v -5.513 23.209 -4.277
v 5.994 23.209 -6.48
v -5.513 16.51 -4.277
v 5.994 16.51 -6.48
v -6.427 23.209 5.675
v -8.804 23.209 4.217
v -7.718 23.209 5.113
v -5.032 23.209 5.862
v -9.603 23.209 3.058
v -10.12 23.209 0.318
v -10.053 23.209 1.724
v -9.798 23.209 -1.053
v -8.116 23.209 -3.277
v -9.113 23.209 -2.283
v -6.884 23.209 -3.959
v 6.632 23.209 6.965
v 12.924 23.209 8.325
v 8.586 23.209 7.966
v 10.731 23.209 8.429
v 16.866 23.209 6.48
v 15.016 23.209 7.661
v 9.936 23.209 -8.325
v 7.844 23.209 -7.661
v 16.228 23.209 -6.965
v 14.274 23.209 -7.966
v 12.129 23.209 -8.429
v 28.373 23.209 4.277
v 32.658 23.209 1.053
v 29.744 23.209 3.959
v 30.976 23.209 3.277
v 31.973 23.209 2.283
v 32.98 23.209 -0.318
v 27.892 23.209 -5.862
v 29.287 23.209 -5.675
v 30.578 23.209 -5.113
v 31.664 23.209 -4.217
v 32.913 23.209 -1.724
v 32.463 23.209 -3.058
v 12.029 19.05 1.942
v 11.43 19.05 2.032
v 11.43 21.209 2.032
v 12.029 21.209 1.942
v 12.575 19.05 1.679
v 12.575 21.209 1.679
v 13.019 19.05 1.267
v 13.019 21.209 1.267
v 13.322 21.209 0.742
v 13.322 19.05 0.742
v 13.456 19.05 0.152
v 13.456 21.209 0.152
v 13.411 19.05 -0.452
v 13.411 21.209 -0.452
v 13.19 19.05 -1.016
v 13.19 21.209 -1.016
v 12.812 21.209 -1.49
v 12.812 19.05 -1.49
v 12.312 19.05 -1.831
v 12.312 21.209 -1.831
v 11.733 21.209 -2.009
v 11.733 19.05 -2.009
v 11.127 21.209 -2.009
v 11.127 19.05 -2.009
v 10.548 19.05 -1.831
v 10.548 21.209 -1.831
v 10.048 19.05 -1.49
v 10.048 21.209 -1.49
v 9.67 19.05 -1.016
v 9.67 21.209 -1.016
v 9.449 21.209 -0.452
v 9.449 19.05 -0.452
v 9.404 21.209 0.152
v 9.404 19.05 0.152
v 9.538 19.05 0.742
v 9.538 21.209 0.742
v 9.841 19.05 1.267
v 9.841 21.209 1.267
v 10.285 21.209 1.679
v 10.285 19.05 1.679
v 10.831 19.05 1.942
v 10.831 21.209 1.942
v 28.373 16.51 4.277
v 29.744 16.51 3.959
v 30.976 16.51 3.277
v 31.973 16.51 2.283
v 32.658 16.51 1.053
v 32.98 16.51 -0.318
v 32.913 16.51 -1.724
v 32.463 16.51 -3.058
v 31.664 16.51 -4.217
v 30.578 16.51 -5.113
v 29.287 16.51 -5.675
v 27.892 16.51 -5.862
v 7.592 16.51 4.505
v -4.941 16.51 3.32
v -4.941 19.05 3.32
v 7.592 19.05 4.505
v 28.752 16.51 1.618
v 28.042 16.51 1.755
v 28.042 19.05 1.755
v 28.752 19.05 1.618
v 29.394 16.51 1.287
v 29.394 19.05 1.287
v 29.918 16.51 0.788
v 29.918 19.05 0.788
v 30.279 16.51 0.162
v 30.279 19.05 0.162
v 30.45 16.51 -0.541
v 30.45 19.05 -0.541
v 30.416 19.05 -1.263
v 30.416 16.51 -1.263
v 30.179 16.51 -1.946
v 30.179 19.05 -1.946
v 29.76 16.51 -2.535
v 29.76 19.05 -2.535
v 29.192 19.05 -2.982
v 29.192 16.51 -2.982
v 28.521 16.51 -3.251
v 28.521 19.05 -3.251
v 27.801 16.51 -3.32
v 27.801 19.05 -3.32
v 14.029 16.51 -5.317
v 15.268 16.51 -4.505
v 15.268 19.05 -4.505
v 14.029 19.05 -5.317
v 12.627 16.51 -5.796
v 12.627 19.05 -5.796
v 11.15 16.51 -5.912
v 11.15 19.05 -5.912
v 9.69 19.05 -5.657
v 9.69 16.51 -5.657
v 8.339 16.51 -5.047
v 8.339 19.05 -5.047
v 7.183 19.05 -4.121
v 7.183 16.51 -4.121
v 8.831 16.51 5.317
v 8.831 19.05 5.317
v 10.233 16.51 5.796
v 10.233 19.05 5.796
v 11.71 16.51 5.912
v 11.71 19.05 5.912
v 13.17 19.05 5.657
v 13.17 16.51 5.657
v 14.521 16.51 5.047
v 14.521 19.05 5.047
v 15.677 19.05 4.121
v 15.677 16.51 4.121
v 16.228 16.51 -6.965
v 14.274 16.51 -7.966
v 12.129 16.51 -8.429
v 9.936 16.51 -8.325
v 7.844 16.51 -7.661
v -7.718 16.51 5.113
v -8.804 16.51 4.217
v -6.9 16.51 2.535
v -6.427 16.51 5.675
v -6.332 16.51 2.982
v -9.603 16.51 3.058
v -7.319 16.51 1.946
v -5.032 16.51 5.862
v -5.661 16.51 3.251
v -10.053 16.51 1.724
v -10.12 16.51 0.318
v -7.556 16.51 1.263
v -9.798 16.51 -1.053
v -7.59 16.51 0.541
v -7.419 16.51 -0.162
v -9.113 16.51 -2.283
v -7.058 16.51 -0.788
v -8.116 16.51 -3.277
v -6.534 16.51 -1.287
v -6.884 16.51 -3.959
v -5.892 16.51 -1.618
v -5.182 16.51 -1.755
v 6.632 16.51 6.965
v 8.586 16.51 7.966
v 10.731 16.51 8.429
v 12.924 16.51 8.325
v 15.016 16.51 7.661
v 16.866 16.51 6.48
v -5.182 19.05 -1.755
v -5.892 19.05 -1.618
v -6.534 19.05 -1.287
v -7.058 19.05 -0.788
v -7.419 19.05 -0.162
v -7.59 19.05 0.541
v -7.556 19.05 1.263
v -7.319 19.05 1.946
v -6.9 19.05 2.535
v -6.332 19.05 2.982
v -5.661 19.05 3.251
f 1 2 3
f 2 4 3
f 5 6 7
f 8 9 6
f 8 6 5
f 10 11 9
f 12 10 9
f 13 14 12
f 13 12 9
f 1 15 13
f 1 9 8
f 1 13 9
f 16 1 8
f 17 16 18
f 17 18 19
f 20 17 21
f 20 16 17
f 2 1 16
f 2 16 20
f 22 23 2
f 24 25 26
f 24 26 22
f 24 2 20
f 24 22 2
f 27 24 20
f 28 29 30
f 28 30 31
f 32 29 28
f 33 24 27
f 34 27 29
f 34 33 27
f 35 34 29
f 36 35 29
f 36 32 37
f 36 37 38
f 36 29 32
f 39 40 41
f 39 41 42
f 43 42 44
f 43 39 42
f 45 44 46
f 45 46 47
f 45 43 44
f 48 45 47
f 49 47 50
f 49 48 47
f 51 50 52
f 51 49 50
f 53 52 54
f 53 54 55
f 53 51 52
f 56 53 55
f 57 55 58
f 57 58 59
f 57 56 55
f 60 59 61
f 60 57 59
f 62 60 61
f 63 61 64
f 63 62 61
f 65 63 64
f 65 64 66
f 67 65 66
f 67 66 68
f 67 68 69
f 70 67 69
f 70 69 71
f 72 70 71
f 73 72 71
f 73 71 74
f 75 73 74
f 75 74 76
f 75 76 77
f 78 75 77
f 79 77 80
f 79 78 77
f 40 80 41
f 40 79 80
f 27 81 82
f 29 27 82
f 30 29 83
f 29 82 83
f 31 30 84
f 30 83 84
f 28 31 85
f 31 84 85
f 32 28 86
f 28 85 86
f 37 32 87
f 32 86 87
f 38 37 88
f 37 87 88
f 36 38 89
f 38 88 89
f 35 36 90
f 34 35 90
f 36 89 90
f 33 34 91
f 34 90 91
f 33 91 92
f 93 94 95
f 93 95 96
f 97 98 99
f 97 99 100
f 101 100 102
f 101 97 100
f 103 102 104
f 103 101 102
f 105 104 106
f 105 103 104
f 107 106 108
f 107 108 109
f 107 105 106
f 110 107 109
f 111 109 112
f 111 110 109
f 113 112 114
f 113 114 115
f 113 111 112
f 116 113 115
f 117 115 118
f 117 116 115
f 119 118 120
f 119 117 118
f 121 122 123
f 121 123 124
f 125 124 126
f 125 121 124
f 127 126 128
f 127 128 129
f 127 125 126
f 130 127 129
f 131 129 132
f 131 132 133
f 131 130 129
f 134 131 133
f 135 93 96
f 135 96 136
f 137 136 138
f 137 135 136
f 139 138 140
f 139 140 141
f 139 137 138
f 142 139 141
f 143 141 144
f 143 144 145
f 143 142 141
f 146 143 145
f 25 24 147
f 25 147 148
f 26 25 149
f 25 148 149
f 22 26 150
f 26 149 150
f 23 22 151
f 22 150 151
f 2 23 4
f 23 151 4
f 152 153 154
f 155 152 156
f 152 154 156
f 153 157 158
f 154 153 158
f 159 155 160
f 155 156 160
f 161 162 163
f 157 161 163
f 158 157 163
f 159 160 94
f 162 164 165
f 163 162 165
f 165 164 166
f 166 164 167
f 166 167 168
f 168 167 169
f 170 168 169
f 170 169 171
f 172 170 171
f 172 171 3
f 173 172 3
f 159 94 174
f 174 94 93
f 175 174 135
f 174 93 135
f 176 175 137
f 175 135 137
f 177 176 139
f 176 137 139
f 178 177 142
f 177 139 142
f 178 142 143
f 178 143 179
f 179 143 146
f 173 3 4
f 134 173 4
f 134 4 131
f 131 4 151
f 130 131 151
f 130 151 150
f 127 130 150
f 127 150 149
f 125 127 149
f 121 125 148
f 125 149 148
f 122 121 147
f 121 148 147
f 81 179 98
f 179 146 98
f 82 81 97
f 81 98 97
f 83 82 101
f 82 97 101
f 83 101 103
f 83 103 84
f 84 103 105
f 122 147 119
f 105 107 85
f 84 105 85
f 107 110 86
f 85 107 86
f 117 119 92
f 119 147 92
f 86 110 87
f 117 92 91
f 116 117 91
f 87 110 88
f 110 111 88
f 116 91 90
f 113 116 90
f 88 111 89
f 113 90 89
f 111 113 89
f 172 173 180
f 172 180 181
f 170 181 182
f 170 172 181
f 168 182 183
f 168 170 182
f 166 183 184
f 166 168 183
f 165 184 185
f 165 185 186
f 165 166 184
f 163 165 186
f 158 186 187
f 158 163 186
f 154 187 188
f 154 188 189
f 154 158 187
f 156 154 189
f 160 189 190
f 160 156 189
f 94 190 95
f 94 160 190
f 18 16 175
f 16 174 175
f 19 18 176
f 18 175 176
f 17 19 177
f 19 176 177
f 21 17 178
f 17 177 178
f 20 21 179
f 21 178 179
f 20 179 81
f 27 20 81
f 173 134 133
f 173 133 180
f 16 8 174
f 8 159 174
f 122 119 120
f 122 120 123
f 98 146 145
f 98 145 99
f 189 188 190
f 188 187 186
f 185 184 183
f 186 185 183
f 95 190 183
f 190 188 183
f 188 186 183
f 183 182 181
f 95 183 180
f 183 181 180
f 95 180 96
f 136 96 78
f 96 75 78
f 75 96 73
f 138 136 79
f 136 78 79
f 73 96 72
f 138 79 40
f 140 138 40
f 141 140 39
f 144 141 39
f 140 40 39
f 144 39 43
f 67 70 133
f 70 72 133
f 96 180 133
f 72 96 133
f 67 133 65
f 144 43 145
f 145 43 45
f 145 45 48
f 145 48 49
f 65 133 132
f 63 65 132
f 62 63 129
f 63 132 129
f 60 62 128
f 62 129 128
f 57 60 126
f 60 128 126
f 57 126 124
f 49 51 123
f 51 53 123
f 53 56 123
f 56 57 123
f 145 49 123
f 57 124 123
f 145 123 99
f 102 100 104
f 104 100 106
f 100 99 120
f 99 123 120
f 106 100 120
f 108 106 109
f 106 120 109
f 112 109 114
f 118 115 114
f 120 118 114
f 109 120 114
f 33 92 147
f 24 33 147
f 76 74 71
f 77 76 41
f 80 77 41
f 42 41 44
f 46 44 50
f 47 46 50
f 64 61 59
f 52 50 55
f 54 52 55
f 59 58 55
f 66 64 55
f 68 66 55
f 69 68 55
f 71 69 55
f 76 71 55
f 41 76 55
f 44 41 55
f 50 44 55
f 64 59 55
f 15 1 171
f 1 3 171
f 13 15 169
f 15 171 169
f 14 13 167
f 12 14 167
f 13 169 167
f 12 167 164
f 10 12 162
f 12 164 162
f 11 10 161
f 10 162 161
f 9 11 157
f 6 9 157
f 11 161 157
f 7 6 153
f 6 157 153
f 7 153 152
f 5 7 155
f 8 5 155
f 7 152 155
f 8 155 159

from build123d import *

# Parameters (mm, degrees)
SKETCH1_R           = 2.032
BOSS_EXTRUDE1_DEPTH = 2.159
BOSS_EXTRUDE2_START = -2.54
BOSS_EXTRUDE2_DEPTH = 2.54
BOSS_EXTRUDE3_START = 2.159
BOSS_EXTRUDE3_DEPTH = 2


with BuildPart() as part:
    # Sketch1 → Boss-Extrude1 (new body)
    with BuildSketch(Plane(origin=(0, 19.05, 0), x_dir=(1, 0, 0), z_dir=(0, 1, 0))):
        with BuildLine():
            Line((27.891662372, 5.862371385), (16.22825993, 6.965475496))
            ThreePointArc((16.22825993, 6.965475496), (11.029140385, 8.448695687), (5.993806888, 6.479888246))
            Line((5.993806888, 6.479888246), (-5.512759891, 4.277454099))
            ThreePointArc((-5.512759891, 4.277454099), (-10.135739741, -1.023215233), (-5.031662372, -5.862371385))
            Line((-5.031662372, -5.862371385), (6.63174007, -6.965475496))
            ThreePointArc((6.63174007, -6.965475496), (11.830859615, -8.448695687), (16.866193112, -6.479888246))
            Line((16.866193112, -6.479888246), (28.372759891, -4.277454099))
            ThreePointArc((28.372759891, -4.277454099), (32.995739741, 1.023215233), (27.891662372, 5.862371385))
        make_face()
        with Locations(Location((11.43, 0, 0), (0, 0, 270))):
            Circle(SKETCH1_R, mode=Mode.SUBTRACT)
    extrude(amount=BOSS_EXTRUDE1_DEPTH)

    # Sketch1<3> → Boss-Extrude2 (add)
    with BuildSketch(Plane(origin=(0, 19.05, 0), x_dir=(1, 0, 0), z_dir=(0, 1, 0)).offset(BOSS_EXTRUDE2_START)):
        with BuildLine():
            Line((5.993806888, 6.479888246), (-5.512759891, 4.277454099))
            ThreePointArc((-5.512759891, 4.277454099), (-10.135739741, -1.023215233), (-5.031662372, -5.862371385))
            Line((-5.031662372, -5.862371385), (6.63174007, -6.965475496))
            ThreePointArc((6.63174007, -6.965475496), (11.830859615, -8.448695687), (16.866193112, -6.479888246))
            Line((16.866193112, -6.479888246), (28.372759891, -4.277454099))
            ThreePointArc((28.372759891, -4.277454099), (32.995739741, 1.023215233), (27.891662372, 5.862371385))
            Line((27.891662372, 5.862371385), (16.22825993, 6.965475496))
            ThreePointArc((16.22825993, 6.965475496), (11.029140385, 8.448695687), (5.993806888, 6.479888246))
        make_face()
        with BuildLine():
            ThreePointArc((28.0418263, -1.754687144), (30.458593889, 0.90283697), (27.801069775, 3.319604559))
            Line((27.801069775, 3.319604559), (15.268026397, 4.504957782))
            ThreePointArc((15.268026397, 4.504957782), (11.149518648, 5.911549835), (7.18268751, 4.121338114))
            Line((7.18268751, 4.121338114), (-5.1818263, 1.754687144))
            ThreePointArc((-5.1818263, 1.754687144), (-7.598593889, -0.90283697), (-4.941069775, -3.319604559))
            Line((-4.941069775, -3.319604559), (7.591973603, -4.504957782))
            ThreePointArc((7.591973603, -4.504957782), (11.710481352, -5.911549835), (15.67731249, -4.121338114))
            Line((15.67731249, -4.121338114), (28.0418263, -1.754687144))
        make_face(mode=Mode.SUBTRACT)
    extrude(amount=BOSS_EXTRUDE2_DEPTH)

    # Sketch1<4> → Boss-Extrude3 (add)
    with BuildSketch(Plane(origin=(0, 19.05, 0), x_dir=(1, 0, 0), z_dir=(0, 1, 0)).offset(BOSS_EXTRUDE3_START)):
        with BuildLine():
            Line((27.891662372, 5.862371385), (16.22825993, 6.965475496))
            ThreePointArc((16.22825993, 6.965475496), (11.029140385, 8.448695687), (5.993806888, 6.479888246))
            Line((5.993806888, 6.479888246), (-5.512759891, 4.277454099))
            ThreePointArc((-5.512759891, 4.277454099), (-10.135739741, -1.023215233), (-5.031662372, -5.862371385))
            Line((-5.031662372, -5.862371385), (6.63174007, -6.965475496))
            ThreePointArc((6.63174007, -6.965475496), (11.830859615, -8.448695687), (16.866193112, -6.479888246))
            Line((16.866193112, -6.479888246), (28.372759891, -4.277454099))
            ThreePointArc((28.372759891, -4.277454099), (32.995739741, 1.023215233), (27.891662372, 5.862371385))
        make_face()
    extrude(amount=BOSS_EXTRUDE3_DEPTH)


solid = part.part
